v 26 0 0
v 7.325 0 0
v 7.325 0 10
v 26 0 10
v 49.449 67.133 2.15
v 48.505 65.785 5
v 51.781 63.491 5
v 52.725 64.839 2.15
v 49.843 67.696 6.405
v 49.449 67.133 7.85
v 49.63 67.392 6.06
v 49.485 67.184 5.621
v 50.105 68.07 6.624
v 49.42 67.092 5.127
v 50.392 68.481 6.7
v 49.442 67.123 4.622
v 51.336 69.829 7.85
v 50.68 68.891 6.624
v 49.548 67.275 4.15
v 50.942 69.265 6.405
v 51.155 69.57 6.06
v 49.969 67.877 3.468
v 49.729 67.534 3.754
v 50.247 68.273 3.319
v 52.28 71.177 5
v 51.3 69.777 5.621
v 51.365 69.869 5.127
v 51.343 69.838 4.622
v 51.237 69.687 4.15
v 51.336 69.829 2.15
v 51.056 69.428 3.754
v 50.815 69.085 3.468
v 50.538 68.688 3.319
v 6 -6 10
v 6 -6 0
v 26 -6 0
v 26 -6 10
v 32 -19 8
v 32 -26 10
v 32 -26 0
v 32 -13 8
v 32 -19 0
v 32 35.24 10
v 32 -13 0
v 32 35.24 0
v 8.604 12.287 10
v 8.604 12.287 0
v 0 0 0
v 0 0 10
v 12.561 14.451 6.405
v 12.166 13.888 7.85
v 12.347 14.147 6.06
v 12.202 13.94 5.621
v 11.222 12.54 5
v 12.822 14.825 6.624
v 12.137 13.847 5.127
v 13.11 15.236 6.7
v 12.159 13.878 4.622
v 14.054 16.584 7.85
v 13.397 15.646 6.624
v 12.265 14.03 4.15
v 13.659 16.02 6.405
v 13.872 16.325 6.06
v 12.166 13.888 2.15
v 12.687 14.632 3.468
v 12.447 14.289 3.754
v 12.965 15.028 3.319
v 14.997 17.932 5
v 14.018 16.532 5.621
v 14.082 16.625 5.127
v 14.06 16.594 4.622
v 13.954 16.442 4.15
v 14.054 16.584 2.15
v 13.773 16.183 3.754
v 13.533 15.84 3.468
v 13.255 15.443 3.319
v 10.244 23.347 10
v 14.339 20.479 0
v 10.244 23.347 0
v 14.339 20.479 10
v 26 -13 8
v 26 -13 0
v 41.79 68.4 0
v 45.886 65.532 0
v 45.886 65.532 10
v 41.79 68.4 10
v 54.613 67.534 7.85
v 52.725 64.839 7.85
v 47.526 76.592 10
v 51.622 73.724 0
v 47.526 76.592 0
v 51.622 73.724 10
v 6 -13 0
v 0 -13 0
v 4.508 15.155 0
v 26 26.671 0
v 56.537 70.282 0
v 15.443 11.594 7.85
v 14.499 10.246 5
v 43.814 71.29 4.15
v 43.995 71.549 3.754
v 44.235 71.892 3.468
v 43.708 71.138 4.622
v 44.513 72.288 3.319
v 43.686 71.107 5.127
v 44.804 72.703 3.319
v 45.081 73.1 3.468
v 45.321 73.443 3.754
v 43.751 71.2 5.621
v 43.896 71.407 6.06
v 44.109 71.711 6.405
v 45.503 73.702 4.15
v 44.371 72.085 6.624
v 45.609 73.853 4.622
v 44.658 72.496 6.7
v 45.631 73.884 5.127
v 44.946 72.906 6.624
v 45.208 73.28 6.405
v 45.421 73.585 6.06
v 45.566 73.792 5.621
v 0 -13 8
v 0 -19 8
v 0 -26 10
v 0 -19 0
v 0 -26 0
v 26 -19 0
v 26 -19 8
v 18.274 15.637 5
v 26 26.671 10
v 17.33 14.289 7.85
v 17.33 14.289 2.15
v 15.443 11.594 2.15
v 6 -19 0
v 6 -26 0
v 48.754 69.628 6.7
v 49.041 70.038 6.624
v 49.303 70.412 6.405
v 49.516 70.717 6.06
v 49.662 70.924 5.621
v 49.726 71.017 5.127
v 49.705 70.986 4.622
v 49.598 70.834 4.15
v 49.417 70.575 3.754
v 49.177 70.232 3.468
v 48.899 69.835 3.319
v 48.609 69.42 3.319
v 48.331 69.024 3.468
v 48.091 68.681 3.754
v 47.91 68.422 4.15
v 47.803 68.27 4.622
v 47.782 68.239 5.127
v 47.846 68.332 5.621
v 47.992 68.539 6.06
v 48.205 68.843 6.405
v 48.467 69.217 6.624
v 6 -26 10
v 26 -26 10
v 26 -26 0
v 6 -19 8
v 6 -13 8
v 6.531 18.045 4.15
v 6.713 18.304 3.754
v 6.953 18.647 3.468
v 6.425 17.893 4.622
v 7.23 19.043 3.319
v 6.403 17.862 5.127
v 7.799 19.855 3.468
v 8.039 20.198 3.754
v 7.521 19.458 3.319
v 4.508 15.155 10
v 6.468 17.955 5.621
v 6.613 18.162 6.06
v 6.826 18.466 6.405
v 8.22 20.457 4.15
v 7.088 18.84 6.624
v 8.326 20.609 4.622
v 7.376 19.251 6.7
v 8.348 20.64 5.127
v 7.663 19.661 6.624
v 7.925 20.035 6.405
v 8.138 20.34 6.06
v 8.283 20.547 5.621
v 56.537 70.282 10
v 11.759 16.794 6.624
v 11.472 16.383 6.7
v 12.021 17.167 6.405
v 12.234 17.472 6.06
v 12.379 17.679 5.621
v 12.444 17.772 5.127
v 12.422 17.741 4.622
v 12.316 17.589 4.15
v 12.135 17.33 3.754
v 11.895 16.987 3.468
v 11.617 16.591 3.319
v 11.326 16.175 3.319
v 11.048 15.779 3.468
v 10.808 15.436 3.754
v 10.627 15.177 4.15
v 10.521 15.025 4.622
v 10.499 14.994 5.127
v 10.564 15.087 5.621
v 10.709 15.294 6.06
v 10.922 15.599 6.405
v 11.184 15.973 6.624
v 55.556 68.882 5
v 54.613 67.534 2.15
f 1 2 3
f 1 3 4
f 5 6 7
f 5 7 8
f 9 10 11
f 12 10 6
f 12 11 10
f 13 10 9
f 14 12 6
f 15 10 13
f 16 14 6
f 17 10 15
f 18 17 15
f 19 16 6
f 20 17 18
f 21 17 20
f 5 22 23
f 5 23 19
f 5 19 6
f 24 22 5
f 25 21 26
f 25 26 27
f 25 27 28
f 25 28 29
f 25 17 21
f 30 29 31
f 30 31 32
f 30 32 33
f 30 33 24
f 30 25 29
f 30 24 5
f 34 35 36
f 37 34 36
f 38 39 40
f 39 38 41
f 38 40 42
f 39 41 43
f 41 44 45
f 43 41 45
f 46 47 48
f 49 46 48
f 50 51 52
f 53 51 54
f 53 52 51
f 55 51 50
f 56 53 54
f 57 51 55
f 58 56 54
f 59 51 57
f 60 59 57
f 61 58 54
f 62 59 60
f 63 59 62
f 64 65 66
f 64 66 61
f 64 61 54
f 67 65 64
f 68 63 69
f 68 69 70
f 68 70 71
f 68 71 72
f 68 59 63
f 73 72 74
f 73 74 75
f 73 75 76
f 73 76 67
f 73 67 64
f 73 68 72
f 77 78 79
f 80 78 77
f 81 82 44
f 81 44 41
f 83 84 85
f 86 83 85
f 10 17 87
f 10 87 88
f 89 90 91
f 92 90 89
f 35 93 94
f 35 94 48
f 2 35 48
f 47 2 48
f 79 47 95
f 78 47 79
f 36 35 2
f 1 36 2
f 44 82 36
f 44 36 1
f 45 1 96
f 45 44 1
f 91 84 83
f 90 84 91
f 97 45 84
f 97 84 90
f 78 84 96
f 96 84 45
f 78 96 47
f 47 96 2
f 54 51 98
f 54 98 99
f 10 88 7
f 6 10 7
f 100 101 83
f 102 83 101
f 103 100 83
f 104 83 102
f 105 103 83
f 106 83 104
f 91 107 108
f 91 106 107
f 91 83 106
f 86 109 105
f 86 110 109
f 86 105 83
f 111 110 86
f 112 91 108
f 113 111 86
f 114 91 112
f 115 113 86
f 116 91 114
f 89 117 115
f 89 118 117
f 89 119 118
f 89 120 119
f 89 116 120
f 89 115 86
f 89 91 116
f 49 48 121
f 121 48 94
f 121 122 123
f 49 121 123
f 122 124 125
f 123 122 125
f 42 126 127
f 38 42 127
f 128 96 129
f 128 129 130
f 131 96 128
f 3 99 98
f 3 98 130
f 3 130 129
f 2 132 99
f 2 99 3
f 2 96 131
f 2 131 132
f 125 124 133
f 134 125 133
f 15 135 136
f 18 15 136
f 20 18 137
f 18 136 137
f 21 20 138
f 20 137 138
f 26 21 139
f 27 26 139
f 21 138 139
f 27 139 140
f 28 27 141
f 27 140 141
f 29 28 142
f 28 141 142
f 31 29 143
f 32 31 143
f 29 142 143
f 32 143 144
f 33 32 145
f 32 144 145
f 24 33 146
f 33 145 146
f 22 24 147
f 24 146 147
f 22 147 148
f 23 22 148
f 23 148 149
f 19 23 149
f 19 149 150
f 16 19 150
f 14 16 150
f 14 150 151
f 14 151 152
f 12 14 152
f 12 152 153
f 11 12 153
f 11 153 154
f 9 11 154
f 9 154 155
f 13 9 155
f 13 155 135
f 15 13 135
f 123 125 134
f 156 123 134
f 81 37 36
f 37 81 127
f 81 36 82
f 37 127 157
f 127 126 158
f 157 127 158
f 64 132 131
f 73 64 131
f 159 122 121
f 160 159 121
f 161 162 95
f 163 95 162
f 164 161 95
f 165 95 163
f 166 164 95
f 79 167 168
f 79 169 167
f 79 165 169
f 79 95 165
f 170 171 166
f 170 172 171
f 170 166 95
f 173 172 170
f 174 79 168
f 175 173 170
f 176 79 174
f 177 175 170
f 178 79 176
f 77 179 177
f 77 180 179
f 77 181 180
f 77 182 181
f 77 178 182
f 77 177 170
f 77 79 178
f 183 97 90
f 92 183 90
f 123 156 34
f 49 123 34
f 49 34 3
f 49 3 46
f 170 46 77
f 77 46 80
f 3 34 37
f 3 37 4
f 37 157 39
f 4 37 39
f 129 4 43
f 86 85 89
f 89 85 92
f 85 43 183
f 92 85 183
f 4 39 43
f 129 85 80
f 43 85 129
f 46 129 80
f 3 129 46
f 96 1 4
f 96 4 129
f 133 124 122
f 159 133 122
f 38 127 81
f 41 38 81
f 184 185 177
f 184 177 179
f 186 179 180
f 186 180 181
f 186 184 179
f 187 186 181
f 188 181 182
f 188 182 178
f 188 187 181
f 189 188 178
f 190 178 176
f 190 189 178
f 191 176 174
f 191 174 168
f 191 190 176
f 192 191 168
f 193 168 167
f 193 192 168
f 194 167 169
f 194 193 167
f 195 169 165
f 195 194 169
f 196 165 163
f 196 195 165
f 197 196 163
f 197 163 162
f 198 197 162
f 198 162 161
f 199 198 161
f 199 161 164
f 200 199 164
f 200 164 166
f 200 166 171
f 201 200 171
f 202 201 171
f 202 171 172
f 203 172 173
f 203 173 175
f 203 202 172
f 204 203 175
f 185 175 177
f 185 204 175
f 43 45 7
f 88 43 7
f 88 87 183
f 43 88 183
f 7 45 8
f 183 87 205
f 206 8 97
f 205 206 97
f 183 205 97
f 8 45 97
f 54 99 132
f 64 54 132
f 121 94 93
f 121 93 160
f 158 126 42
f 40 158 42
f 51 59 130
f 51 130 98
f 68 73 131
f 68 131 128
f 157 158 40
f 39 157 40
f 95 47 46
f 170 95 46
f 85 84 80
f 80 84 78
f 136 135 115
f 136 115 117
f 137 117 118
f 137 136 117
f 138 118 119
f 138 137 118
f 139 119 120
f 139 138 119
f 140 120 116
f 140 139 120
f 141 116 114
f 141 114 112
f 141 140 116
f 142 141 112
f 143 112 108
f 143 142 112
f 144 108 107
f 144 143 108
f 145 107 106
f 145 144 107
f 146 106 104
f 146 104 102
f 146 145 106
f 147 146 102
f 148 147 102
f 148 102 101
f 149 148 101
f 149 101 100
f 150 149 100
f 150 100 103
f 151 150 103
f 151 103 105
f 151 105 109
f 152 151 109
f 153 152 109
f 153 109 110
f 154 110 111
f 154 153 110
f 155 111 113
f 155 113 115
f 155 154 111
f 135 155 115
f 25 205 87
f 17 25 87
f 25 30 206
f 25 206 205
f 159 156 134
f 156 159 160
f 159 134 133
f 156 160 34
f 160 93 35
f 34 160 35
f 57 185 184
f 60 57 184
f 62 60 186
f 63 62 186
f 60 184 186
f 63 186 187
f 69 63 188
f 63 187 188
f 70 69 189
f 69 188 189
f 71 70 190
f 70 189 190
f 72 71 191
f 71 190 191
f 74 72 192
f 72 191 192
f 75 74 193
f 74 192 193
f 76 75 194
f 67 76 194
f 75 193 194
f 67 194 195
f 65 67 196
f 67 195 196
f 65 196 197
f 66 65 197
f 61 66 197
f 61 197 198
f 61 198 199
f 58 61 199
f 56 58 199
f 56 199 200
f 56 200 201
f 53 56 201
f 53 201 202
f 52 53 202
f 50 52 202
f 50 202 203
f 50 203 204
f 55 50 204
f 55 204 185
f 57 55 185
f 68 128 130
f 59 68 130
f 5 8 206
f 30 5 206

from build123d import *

# Parameters (mm, degrees)
RESSALTO_EXTRUS_O1_DEPTH   = 10
ESBO_O3_W                  = 8
ESBO_O3_H                  = 6
CORTE_EXTRUS_O2_DEPTH      = 1
CORTE_EXTRUS_O2_DEPTH_BACK = 57.536791537
CORTE_EXTRUS_O1_REACH      = 63.225
ESBO_O2_R                  = 1.7
ESBO_O6_W                  = 10
ESBO_O6_H                  = 10
ESBO_O6_R                  = 1.7
RESSALTO_EXTRUS_O2_DEPTH   = 5
CORTE_EXTRUS_O5_DEPTH      = 4


with BuildPart() as part:
    # Esboço1 → Ressalto-extrusão1 (new body)
    with BuildSketch(Plane.XY):
        Polygon((0, 0), (0, -26), (6, -26), (6, -6), (26, -6), (26, -26), (32, -26), (32, 35.240055442), (56.536791537, 70.282225368), (51.621879272, 73.723683986), align=None)
        Polygon((26, 0), (26, 26.671167402), (7.324647533, 0), align=None, mode=Mode.SUBTRACT)
    extrude(amount=RESSALTO_EXTRUS_O1_DEPTH)

    # Esboço3 → Corte-extrusão2 (cut, two sides)
    with BuildSketch(Plane.ZY) as corte_extrus_o2_sk:
        with Locations((4, -16)):
            Rectangle(ESBO_O3_W, ESBO_O3_H)
    extrude(amount=CORTE_EXTRUS_O2_DEPTH, mode=Mode.SUBTRACT)
    extrude(corte_extrus_o2_sk.sketch, amount=-CORTE_EXTRUS_O2_DEPTH_BACK, mode=Mode.SUBTRACT)

    # Esboço2 → Corte-extrusão1 (cut, up to next)
    with BuildSketch(Plane(origin=(0, 0, 0), x_dir=(0, 0, 1), z_dir=(-0.819152044, 0.573576436, 0)), mode=Mode.PRIVATE) as corte_extrus_o1_sk1:
        with Locations((5, 85)):
            Circle(ESBO_O2_R)
    corte_extrus_o1_tool1 = extrude(corte_extrus_o1_sk1.sketch, amount=-CORTE_EXTRUS_O1_REACH, mode=Mode.PRIVATE) & part.part
    add(corte_extrus_o1_tool1.solids().sort_by_distance((48.753997, 69.627924, 5))[0], mode=Mode.SUBTRACT)
    # Esboço2 → Corte-extrusão1 (cut, up to next)
    with BuildSketch(Plane(origin=(0, 0, 0), x_dir=(0, 0, 1), z_dir=(-0.819152044, 0.573576436, 0)), mode=Mode.PRIVATE) as corte_extrus_o1_sk2:
        with Locations((5, 20)):
            Circle(ESBO_O2_R)
    corte_extrus_o1_tool2 = extrude(corte_extrus_o1_sk2.sketch, amount=-CORTE_EXTRUS_O1_REACH, mode=Mode.PRIVATE) & part.part
    add(corte_extrus_o1_tool2.solids().sort_by_distance((11.471529, 16.383041, 5))[0], mode=Mode.SUBTRACT)

    # Esboço6 → Ressalto-extrusão2 (add)
    with BuildSketch(Plane(origin=(0, 0, 0), x_dir=(0, 0, 1), z_dir=(-0.819152044, 0.573576436, 0))):
        with Locations((5, 85)):
            Rectangle(ESBO_O6_W, ESBO_O6_H)
        with Locations((5, 85)):
            Circle(ESBO_O6_R, mode=Mode.SUBTRACT)
        with Locations((5, 20)):
            Rectangle(ESBO_O6_W, ESBO_O6_H)
        with Locations((5, 20)):
            Circle(ESBO_O6_R, mode=Mode.SUBTRACT)
    extrude(amount=RESSALTO_EXTRUS_O2_DEPTH)

    # Esboço7 → Corte-extrusão5 (cut)
    with BuildSketch(Plane(origin=(4.914912266, -3.441458618, 0), x_dir=(0, 0, -1), z_dir=(0.819152044, -0.573576436, 0))):
        Polygon((-2.15, 83.354551733), (-2.15, 86.645448267), (-5, 88.290896534), (-7.85, 86.645448267), (-7.85, 83.354551733), (-5, 81.709103466), align=None)
        Polygon((-2.15, 18.354551733), (-2.15, 21.645448267), (-5, 23.290896534), (-7.85, 21.645448267), (-7.85, 18.354551733), (-5, 16.709103466), align=None)
    extrude(amount=-CORTE_EXTRUS_O5_DEPTH, mode=Mode.SUBTRACT)


solid = part.part
